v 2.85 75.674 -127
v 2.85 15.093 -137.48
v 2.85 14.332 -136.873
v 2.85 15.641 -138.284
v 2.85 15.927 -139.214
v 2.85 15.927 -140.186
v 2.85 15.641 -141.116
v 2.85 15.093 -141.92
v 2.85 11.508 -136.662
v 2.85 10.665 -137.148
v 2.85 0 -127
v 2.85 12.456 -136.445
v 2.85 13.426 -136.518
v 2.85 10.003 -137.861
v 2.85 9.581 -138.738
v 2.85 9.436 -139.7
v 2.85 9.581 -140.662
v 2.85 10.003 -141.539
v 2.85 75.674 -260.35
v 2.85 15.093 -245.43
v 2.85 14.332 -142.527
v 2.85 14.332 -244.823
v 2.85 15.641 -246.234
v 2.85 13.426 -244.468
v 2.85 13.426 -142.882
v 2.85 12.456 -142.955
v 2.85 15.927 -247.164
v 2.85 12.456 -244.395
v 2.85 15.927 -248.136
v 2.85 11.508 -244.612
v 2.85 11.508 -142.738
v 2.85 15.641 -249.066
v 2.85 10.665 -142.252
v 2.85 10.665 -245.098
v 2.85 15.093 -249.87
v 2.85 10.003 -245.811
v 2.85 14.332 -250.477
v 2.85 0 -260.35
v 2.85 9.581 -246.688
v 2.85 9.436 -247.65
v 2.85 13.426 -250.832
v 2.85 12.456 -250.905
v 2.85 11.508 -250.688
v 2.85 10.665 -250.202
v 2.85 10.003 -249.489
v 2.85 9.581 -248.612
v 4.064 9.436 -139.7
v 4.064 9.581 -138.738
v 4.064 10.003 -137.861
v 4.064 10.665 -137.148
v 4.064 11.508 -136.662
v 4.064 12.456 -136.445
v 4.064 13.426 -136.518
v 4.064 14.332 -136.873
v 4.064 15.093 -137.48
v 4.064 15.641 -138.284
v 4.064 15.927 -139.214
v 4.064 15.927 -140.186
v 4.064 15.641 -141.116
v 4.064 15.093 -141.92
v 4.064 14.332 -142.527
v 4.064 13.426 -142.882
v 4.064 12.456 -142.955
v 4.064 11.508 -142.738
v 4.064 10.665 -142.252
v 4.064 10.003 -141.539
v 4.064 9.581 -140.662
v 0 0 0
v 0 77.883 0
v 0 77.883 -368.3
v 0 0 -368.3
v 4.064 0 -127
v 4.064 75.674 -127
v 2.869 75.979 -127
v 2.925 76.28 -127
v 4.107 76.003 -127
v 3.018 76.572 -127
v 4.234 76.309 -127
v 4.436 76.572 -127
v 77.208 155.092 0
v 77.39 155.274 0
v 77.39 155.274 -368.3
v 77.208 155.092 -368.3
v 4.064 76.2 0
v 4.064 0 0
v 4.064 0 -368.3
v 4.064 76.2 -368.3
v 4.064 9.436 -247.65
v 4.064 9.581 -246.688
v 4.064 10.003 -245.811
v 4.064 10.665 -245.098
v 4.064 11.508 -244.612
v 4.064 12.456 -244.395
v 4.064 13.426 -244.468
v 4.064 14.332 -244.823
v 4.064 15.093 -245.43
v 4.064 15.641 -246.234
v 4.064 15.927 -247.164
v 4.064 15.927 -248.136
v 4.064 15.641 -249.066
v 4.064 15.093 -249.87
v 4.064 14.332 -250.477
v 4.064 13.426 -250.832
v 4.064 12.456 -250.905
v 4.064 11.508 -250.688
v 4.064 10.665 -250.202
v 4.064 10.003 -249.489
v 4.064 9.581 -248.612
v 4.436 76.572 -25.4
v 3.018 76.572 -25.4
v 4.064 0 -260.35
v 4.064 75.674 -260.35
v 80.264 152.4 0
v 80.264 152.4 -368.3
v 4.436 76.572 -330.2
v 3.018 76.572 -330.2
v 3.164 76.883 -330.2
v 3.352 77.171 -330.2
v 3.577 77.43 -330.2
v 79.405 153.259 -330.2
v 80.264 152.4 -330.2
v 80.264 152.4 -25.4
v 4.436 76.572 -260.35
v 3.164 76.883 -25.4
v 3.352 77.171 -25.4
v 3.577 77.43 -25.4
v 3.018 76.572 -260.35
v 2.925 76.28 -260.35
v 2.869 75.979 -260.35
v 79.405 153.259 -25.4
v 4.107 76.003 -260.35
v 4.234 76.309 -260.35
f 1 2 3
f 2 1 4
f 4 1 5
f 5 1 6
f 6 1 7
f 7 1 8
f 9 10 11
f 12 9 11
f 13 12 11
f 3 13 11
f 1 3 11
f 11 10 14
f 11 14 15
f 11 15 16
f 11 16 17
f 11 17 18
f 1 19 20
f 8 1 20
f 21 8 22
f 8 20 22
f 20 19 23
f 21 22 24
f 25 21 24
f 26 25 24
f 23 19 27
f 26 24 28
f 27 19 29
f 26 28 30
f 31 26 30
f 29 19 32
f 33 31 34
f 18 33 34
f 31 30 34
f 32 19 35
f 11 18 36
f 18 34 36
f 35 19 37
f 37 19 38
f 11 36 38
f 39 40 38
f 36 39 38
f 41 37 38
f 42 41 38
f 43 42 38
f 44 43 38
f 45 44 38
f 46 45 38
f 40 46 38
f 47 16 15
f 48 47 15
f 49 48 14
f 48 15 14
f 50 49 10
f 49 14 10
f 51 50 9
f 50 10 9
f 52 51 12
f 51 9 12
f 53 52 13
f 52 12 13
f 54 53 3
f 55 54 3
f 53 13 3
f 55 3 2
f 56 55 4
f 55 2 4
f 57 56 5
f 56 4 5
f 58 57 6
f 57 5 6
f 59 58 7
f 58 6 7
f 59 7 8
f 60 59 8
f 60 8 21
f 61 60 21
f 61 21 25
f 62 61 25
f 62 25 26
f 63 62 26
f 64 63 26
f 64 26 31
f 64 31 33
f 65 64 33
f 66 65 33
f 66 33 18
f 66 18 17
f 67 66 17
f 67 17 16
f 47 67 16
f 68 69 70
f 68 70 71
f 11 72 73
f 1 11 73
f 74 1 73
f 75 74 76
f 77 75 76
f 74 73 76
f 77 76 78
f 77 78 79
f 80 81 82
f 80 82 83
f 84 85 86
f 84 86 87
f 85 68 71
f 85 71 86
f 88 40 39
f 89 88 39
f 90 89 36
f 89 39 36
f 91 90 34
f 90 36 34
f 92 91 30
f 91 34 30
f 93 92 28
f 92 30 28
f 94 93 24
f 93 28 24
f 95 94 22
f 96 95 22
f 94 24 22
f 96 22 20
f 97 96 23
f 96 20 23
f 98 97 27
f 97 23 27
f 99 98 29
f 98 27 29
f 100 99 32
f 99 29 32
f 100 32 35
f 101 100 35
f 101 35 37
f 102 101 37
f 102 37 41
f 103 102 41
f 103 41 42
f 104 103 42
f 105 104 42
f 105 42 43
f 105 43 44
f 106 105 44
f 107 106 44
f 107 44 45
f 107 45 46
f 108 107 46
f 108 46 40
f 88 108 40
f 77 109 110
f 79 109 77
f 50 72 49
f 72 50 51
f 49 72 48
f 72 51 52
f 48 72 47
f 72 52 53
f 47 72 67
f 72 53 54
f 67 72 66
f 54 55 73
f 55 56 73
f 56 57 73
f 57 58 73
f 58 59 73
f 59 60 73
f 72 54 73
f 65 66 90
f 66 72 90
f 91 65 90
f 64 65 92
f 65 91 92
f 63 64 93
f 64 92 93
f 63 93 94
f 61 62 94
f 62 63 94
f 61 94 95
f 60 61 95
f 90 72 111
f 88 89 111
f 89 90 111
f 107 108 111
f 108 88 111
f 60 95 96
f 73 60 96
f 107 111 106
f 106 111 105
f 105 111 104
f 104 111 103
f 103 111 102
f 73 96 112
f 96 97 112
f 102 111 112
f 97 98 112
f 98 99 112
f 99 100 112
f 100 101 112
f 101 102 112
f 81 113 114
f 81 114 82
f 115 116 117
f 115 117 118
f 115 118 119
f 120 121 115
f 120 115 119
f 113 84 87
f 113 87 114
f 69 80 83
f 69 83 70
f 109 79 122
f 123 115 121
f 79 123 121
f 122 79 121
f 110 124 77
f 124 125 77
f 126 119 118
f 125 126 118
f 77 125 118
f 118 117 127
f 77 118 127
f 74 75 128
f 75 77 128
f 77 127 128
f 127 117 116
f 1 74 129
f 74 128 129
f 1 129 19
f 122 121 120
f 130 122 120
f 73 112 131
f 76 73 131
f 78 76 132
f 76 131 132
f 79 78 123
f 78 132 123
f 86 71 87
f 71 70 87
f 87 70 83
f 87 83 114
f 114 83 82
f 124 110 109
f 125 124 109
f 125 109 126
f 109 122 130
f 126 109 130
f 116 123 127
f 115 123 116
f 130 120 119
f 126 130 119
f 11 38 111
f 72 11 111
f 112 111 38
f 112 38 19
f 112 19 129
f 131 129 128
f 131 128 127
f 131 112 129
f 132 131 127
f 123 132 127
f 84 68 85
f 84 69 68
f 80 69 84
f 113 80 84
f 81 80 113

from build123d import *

# Parameters (mm, degrees)
BOSS_EXTRUDE2_DEPTH  = 368.3
CONVERT_SOLID2_START = -368.3
CONVERT_SOLID2_DEPTH = 368.3
SKETCH12_W           = 127
SKETCH12_H           = 76.571974388
CUT_EXTRUDE1_DEPTH   = 292.1
SKETCH13_W           = 31.75
SKETCH13_H           = 76.571974388
CUT_EXTRUDE2_DEPTH   = 292.1
SKETCH14_R           = 3.2639
CUT_EXTRUDE3_DEPTH   = 292.1
SKETCH16_W           = 38.1
SKETCH16_H           = 76.686538097
CUT_EXTRUDE4_DEPTH   = 428.7622778
SKETCH17_W           = 125.224844509
SKETCH17_H           = 76.571974388
CUT_EXTRUDE5_DEPTH   = 428.7622778
SKETCH18_W           = 25.4
SKETCH18_H           = 153.258512485
CUT_EXTRUDE6_DEPTH   = 428.7622778


# Read off the part's stored shape, not the designer's step: Convert-Solid2
with BuildPart() as part:
    # Sketch7 → Boss-Extrude2 (new body)
    with BuildSketch(Plane.XY):
        Polygon((0, 0), (4.064, 0), (4.064, 76.2), (80.264, 152.4), (77.390318041, 155.273681959), (77.208487056, 155.091850973), (0, 77.883363917), align=None)
    extrude(amount=-BOSS_EXTRUDE2_DEPTH)


with BuildPart() as body_2:
    # Convert-Solid2 outline → Convert-Solid2 (new body)
    with BuildSketch(Plane.XY.offset(CONVERT_SOLID2_START)):
        with BuildLine():
            Line((2.84988, 0), (4.064, 0))
            Line((4.064, 0), (4.064, 75.673948776))
            ThreePointArc((4.064, 75.673948776), (4.160672994, 76.159956735), (4.435974388, 76.571974388))
            Line((4.435974388, 76.571974388), (80.264, 152.4))
            Line((80.264, 152.4), (79.405487515, 153.258512485))
            Line((79.405487515, 153.258512485), (3.577461903, 77.430486873))
            ThreePointArc((3.577461903, 77.430486873), (3.038972376, 76.624580344), (2.84988, 75.673948776))
            Line((2.84988, 75.673948776), (2.84988, 0))
        make_face()
    extrude(amount=CONVERT_SOLID2_DEPTH)

    # Sketch12 → Cut-Extrude1 (cut)
    with BuildSketch(Plane(origin=(152.4, 0, 0), x_dir=(0, 0, -1), z_dir=(1, 0, 0))):
        with Locations((63.5, 38.285987194)):
            Rectangle(SKETCH12_W, SKETCH12_H)
    extrude(amount=-CUT_EXTRUDE1_DEPTH, mode=Mode.SUBTRACT)

    # Sketch13 → Cut-Extrude2 (cut)
    with BuildSketch(Plane(origin=(152.4, 0, 0), x_dir=(0, 0, -1), z_dir=(1, 0, 0))):
        with Locations((276.225, 38.285987194)):
            Rectangle(SKETCH13_W, SKETCH13_H)
    extrude(amount=-CUT_EXTRUDE2_DEPTH, mode=Mode.SUBTRACT)

    # Sketch14 → Cut-Extrude3 (cut)
    with BuildSketch(Plane.ZY.offset(-2.84988)):
        with Locations(Location((-247.65, 12.7, 0), (0, 0, 270))):
            Circle(SKETCH14_R)
        with Locations(Location((-139.7, 12.7, 0), (0, 0, 270))):
            Circle(SKETCH14_R)
    extrude(amount=-CUT_EXTRUDE3_DEPTH, mode=Mode.SUBTRACT)

    # Sketch16 → Cut-Extrude4 (cut, through all)
    with BuildSketch(Plane(origin=(152.4, 0, 0), x_dir=(0, 0, -1), z_dir=(1, 0, 0))):
        with Locations((349.25, 114.915243437)):
            Rectangle(SKETCH16_W, SKETCH16_H)
    extrude(amount=-CUT_EXTRUDE4_DEPTH, mode=Mode.SUBTRACT)

    # Sketch17 → Cut-Extrude5 (cut, through all)
    with BuildSketch(Plane(origin=(152.4, 0, 0), x_dir=(0, 0, -1), z_dir=(1, 0, 0))):
        with Locations((322.962422254, 38.285987194)):
            Rectangle(SKETCH17_W, SKETCH17_H)
    extrude(amount=-CUT_EXTRUDE5_DEPTH, mode=Mode.SUBTRACT)

    # Sketch18 → Cut-Extrude6 (cut, through all)
    with BuildSketch(Plane(origin=(152.4, 0, 0), x_dir=(0, 0, -1), z_dir=(1, 0, 0))):
        with Locations((12.7, 76.629256243)):
            Rectangle(SKETCH18_W, SKETCH18_H)
    extrude(amount=-CUT_EXTRUDE6_DEPTH, mode=Mode.SUBTRACT)


solid = Compound([part.part, body_2.part])
